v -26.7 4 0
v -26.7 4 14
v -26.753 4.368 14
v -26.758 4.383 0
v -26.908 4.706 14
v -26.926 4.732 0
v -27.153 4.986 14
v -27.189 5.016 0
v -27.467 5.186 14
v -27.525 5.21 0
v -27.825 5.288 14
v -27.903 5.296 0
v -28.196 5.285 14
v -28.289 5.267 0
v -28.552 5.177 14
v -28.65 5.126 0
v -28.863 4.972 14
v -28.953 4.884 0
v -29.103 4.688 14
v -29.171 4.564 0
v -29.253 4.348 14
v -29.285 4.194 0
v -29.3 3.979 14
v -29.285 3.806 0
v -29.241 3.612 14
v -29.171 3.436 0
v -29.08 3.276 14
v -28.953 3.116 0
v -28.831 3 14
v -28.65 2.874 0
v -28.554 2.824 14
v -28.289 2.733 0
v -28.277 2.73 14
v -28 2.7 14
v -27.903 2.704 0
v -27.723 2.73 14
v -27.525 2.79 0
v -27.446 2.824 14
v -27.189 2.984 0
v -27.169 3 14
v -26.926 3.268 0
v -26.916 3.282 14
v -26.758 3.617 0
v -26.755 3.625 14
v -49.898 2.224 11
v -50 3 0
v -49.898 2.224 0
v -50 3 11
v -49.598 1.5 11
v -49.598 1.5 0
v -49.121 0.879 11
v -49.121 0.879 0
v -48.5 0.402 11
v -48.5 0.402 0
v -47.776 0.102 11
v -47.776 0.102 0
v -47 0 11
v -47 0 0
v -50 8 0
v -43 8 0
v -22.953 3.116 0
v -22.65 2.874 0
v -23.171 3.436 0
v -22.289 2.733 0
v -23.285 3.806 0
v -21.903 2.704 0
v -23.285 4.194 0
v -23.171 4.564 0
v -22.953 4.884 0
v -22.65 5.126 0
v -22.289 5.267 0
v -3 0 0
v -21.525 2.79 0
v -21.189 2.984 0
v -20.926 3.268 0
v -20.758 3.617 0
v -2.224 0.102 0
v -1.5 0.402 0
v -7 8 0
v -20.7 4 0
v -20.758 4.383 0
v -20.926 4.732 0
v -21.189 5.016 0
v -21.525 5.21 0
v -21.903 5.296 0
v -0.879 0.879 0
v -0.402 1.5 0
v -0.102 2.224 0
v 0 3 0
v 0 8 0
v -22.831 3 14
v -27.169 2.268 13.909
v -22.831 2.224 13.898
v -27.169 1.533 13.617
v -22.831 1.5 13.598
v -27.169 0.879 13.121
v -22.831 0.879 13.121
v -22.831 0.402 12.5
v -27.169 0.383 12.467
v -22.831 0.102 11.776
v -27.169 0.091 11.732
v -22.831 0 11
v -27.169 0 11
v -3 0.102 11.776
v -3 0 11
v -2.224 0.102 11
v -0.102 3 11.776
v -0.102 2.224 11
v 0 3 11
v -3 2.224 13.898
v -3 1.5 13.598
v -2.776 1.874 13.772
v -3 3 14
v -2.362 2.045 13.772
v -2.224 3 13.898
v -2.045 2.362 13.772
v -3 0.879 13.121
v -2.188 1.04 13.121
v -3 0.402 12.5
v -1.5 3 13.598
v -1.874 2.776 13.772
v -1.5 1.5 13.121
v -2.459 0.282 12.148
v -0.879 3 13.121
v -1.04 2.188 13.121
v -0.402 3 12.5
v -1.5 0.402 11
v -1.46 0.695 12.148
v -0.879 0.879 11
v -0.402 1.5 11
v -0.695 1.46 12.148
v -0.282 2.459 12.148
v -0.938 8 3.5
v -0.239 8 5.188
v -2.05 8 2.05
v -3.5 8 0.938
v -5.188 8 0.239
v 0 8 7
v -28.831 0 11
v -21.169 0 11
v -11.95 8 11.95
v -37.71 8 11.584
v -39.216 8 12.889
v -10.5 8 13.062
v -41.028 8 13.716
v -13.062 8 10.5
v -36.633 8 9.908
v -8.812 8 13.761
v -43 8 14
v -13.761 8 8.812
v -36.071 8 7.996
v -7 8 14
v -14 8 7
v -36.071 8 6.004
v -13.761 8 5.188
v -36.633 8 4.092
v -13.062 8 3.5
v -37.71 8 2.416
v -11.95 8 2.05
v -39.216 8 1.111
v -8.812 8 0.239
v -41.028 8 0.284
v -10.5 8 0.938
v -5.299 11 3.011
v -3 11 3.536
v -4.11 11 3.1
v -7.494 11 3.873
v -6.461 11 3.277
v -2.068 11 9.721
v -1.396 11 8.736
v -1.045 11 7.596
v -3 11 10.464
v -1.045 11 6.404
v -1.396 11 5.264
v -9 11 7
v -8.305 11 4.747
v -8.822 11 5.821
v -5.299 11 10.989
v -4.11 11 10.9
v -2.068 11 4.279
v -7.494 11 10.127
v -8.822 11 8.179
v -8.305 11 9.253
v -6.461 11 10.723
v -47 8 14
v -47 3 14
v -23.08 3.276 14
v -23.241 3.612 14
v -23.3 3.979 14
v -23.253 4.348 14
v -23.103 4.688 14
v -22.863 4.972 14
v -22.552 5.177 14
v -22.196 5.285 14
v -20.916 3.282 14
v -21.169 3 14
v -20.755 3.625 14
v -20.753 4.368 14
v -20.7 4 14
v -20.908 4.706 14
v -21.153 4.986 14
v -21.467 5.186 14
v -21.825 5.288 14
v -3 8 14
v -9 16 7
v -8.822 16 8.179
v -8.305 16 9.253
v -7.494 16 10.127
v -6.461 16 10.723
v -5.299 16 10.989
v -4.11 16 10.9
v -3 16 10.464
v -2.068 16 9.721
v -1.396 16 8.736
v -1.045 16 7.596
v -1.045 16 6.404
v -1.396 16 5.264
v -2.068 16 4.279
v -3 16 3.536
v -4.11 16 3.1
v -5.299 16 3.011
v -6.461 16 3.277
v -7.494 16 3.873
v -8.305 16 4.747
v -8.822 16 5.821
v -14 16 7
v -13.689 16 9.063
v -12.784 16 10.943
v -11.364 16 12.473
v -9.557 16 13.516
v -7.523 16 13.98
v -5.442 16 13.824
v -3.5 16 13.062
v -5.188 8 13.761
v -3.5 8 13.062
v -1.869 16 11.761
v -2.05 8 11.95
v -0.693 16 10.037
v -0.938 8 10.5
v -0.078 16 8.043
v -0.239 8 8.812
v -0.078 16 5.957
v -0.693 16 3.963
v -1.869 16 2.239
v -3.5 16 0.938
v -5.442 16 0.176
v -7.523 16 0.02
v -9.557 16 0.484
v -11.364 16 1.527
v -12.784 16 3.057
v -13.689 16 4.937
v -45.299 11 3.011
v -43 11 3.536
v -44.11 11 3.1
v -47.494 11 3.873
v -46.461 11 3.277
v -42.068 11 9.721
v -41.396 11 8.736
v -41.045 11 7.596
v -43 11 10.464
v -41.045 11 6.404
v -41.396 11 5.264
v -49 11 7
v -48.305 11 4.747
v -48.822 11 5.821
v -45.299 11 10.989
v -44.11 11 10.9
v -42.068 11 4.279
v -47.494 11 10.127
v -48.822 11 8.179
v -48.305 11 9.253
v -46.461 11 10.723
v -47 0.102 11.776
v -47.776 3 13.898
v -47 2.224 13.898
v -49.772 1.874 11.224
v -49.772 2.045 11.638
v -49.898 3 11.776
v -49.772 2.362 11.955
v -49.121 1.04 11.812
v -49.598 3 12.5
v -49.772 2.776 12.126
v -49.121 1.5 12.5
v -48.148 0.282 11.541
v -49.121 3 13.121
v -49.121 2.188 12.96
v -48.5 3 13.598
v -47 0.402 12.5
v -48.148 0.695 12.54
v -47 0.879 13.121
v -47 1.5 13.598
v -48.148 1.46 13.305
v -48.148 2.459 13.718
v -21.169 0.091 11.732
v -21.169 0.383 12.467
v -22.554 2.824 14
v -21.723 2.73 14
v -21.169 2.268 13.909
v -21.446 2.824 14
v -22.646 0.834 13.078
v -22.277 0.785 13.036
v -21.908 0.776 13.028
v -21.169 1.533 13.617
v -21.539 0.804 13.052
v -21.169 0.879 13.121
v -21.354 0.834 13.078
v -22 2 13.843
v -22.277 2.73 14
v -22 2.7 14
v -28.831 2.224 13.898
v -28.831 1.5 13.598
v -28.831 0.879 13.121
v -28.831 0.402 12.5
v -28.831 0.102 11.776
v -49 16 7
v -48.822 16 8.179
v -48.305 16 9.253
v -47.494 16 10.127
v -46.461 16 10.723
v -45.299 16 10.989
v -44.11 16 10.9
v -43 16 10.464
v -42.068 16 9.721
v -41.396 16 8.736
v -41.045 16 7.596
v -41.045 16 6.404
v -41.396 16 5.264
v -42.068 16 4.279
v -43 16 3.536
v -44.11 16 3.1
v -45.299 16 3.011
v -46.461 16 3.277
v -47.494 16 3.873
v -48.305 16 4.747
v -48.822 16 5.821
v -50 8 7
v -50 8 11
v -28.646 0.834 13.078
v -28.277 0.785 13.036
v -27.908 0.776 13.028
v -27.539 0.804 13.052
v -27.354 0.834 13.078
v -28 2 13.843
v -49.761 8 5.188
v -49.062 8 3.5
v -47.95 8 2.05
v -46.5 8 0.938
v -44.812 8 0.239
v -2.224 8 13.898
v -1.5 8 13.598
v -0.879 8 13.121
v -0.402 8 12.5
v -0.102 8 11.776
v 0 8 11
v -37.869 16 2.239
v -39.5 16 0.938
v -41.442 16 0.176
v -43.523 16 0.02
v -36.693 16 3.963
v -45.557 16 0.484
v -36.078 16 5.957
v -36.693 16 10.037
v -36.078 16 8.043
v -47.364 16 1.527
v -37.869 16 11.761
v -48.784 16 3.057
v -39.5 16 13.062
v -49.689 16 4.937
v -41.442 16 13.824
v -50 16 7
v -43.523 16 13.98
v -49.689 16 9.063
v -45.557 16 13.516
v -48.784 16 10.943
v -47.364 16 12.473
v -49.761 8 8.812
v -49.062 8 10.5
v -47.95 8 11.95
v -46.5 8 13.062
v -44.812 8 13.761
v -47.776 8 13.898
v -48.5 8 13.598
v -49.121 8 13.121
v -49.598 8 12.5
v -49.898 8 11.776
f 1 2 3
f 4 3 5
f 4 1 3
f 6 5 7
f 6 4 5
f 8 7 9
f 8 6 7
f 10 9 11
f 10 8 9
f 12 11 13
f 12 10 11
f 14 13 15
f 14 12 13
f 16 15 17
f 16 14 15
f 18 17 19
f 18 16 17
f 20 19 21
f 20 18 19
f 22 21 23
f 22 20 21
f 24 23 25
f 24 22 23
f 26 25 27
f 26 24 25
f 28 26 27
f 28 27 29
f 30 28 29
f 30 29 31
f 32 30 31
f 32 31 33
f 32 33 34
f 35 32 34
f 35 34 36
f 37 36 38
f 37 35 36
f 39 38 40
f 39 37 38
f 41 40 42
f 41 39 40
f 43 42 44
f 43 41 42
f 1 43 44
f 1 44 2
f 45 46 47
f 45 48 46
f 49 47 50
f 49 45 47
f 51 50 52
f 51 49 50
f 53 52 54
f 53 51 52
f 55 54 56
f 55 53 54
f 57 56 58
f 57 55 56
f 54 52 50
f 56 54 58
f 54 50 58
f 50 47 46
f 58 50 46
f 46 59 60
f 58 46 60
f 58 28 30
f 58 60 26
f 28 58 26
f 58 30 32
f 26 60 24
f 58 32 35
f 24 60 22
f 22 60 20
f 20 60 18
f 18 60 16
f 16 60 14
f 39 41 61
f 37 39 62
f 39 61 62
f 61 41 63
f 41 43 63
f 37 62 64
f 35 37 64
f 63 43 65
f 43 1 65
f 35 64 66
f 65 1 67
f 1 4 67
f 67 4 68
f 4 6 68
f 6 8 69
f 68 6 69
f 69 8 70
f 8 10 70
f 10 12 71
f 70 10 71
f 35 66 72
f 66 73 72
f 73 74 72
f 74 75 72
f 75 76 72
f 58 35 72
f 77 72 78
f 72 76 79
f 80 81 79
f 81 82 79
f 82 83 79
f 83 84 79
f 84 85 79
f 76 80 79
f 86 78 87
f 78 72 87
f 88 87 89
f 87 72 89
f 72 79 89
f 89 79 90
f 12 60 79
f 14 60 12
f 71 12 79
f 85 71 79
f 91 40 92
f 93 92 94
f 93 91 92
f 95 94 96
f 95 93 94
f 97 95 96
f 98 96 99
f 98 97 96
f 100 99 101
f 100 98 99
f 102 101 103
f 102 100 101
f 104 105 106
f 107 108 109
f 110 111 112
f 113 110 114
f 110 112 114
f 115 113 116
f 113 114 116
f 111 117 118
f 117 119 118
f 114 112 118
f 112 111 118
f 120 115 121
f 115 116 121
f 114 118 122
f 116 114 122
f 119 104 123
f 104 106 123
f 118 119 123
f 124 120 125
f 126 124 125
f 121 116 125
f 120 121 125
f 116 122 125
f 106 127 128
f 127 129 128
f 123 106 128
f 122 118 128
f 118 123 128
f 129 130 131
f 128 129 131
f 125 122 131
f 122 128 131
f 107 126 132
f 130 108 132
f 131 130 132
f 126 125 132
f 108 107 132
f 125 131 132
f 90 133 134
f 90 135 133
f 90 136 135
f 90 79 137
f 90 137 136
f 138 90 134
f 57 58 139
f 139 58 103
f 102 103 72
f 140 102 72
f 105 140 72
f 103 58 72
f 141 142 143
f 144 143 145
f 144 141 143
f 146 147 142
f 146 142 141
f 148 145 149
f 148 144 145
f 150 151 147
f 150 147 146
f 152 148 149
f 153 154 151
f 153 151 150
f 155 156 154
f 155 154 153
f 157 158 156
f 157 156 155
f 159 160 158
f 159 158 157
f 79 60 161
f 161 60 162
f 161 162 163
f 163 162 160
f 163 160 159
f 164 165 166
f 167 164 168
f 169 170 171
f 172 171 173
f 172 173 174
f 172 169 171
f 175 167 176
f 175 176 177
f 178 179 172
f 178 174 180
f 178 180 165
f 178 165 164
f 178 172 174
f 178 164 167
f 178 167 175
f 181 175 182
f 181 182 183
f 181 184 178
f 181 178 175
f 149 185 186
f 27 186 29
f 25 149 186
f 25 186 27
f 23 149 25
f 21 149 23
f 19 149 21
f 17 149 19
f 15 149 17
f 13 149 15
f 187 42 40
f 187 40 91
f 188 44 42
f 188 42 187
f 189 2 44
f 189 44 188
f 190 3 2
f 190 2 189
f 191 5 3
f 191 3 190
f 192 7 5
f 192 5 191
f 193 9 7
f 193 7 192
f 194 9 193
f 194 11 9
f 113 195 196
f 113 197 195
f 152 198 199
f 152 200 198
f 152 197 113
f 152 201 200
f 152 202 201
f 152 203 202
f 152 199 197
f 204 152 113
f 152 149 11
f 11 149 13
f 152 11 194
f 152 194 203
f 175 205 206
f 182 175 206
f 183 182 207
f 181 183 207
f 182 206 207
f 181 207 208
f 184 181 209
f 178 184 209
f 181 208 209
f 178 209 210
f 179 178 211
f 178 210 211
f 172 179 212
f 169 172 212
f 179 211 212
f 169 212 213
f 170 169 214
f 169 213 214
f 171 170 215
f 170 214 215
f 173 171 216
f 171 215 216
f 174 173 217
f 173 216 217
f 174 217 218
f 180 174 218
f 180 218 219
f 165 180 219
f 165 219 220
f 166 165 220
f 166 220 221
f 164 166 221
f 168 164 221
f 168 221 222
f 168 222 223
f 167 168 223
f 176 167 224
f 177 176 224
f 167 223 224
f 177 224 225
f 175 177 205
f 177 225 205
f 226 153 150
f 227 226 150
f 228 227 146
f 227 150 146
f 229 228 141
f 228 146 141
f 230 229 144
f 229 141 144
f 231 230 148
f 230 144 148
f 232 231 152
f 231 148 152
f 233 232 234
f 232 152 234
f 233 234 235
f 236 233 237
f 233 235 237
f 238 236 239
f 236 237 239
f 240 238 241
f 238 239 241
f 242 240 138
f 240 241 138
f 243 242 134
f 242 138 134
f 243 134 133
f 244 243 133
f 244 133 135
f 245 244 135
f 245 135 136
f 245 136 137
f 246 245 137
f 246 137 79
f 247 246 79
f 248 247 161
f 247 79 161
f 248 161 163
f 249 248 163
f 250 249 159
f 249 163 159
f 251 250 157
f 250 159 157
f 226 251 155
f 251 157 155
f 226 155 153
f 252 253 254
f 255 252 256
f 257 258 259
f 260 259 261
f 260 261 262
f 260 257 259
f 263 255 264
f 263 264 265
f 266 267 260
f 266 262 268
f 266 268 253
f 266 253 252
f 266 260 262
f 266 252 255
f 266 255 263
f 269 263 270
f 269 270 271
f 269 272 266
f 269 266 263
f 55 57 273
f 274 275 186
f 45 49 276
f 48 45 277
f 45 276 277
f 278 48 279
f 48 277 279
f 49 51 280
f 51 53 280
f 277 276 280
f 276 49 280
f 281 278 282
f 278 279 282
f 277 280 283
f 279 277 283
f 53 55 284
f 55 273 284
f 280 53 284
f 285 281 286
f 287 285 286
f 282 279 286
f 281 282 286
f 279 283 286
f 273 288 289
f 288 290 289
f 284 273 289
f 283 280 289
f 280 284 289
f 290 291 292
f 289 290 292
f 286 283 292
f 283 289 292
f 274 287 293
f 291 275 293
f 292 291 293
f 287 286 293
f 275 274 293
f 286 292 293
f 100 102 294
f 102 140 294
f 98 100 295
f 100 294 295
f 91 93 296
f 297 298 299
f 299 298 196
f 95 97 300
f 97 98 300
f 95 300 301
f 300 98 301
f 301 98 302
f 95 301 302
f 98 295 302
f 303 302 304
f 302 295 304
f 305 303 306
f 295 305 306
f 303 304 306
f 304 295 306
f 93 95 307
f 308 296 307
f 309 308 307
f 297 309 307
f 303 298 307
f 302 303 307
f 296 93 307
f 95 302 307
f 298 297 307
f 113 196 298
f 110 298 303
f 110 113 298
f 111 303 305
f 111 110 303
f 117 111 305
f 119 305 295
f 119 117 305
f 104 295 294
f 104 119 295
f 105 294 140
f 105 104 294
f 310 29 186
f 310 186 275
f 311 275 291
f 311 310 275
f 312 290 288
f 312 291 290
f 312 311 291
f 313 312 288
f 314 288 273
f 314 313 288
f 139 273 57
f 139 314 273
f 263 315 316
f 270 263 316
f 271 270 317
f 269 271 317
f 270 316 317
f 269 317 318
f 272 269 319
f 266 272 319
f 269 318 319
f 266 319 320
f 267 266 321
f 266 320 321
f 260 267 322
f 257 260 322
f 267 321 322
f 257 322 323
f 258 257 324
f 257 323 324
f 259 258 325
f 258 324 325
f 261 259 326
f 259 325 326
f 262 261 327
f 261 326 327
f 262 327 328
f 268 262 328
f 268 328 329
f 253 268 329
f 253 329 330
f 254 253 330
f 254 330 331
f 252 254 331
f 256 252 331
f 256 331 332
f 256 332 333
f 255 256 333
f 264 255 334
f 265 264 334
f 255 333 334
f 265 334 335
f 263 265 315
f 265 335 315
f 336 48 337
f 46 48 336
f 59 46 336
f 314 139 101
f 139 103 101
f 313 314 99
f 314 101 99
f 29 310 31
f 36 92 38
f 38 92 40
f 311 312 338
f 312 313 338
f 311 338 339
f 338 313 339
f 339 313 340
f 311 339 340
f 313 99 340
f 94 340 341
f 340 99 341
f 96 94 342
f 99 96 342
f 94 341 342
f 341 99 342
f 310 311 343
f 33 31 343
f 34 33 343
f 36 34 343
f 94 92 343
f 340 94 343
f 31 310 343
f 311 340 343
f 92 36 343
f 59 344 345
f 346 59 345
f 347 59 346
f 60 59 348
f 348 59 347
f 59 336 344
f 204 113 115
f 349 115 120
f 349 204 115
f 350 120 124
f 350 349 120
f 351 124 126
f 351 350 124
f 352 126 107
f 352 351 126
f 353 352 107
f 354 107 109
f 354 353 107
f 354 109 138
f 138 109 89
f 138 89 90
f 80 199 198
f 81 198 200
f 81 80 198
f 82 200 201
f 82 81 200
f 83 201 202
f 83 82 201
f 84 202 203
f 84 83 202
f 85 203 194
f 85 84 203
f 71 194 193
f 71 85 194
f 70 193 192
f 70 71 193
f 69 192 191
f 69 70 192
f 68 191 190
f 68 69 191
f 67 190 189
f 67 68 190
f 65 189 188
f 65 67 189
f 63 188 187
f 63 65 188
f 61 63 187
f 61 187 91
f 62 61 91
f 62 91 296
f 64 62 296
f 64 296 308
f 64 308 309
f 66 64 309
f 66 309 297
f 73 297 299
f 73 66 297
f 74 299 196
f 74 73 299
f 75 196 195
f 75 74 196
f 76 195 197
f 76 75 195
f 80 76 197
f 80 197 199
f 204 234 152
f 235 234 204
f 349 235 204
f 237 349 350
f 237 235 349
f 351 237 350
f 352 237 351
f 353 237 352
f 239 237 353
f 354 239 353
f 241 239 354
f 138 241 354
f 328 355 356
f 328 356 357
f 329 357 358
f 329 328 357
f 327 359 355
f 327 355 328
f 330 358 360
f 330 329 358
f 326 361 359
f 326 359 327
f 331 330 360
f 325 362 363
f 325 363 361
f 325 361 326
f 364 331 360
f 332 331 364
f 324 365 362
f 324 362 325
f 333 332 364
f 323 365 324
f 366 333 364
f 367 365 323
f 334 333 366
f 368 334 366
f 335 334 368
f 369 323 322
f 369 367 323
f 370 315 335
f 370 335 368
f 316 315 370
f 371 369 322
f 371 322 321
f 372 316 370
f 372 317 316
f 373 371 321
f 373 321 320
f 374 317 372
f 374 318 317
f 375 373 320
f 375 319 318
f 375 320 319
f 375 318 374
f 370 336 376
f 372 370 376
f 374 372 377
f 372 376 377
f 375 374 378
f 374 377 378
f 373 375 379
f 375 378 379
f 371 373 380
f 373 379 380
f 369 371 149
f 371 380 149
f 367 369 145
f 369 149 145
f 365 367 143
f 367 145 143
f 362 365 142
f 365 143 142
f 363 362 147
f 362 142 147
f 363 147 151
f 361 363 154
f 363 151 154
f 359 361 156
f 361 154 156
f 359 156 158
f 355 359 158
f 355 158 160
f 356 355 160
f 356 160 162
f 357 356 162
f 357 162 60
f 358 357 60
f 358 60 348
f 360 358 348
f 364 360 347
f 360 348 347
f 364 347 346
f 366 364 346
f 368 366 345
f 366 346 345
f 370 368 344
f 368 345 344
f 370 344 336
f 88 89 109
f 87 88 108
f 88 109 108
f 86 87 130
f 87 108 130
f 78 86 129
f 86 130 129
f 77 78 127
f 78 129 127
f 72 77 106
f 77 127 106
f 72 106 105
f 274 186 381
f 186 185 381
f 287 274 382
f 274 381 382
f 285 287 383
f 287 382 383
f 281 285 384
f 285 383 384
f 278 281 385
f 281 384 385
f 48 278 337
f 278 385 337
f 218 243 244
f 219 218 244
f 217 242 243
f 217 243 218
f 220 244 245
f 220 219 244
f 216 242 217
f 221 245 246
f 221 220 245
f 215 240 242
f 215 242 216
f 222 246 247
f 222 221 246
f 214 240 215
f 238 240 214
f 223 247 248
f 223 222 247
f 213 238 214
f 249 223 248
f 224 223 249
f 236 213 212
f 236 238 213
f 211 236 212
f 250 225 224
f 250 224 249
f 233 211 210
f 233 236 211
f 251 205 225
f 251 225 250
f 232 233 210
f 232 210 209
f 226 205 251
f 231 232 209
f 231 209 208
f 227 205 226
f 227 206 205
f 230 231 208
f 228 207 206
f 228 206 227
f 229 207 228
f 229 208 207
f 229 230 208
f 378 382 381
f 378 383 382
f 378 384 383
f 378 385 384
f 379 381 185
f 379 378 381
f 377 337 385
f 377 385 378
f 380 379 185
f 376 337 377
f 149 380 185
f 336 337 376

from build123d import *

# Parameters (mm, degrees)
SKETCH_W     = 50
SKETCH_H     = 8
SKETCH_R     = 1.3
PAD_DEPTH    = 14
SKETCH001_R  = 7
PAD001_DEPTH = 8
SKETCH002_R  = 4
POCKET_DEPTH = 5
FILLET_R     = 3


with BuildPart() as part:
    # Sketch → Pad (new body)
    with BuildSketch(Plane.XY):
        with Locations((-25, 4)):
            Rectangle(SKETCH_W, SKETCH_H)
        with Locations((-28, 4)):
            Circle(SKETCH_R, mode=Mode.SUBTRACT)
        with Locations((-22, 4)):
            Circle(SKETCH_R, mode=Mode.SUBTRACT)
    extrude(amount=PAD_DEPTH)

    # Sketch001 (on Face1 of Pad) → Pad001 (join)
    with BuildSketch(Plane(origin=(0, 8, 0), x_dir=(-1, 0, 0), z_dir=(0, 1, 0))):
        with Locations((7, 7)):
            Circle(SKETCH001_R)
        with Locations((43, 7)):
            Circle(SKETCH001_R)
    extrude(amount=PAD001_DEPTH)

    # Sketch002 (on Face5 of Pad001) → Pocket (cut)
    with BuildSketch(Plane(origin=(0, 16, 0), x_dir=(-1, 0, 0), z_dir=(0, 1, 0))):
        with Locations((5, 7)):
            Circle(SKETCH002_R)
        with Locations((45, 7)):
            Circle(SKETCH002_R)
    extrude(amount=-POCKET_DEPTH, mode=Mode.SUBTRACT)

    # Fillet
    fillet_edges = [part.edges().sort_by_distance(p)[0] for p in [
        (0, 0, 7),
        (-25, 0, 14),
        (-50, 0, 7),
        (0, 4, 14),
        (-50, 4, 14),
    ]]
    fillet(fillet_edges, radius=FILLET_R)


solid = part.part
